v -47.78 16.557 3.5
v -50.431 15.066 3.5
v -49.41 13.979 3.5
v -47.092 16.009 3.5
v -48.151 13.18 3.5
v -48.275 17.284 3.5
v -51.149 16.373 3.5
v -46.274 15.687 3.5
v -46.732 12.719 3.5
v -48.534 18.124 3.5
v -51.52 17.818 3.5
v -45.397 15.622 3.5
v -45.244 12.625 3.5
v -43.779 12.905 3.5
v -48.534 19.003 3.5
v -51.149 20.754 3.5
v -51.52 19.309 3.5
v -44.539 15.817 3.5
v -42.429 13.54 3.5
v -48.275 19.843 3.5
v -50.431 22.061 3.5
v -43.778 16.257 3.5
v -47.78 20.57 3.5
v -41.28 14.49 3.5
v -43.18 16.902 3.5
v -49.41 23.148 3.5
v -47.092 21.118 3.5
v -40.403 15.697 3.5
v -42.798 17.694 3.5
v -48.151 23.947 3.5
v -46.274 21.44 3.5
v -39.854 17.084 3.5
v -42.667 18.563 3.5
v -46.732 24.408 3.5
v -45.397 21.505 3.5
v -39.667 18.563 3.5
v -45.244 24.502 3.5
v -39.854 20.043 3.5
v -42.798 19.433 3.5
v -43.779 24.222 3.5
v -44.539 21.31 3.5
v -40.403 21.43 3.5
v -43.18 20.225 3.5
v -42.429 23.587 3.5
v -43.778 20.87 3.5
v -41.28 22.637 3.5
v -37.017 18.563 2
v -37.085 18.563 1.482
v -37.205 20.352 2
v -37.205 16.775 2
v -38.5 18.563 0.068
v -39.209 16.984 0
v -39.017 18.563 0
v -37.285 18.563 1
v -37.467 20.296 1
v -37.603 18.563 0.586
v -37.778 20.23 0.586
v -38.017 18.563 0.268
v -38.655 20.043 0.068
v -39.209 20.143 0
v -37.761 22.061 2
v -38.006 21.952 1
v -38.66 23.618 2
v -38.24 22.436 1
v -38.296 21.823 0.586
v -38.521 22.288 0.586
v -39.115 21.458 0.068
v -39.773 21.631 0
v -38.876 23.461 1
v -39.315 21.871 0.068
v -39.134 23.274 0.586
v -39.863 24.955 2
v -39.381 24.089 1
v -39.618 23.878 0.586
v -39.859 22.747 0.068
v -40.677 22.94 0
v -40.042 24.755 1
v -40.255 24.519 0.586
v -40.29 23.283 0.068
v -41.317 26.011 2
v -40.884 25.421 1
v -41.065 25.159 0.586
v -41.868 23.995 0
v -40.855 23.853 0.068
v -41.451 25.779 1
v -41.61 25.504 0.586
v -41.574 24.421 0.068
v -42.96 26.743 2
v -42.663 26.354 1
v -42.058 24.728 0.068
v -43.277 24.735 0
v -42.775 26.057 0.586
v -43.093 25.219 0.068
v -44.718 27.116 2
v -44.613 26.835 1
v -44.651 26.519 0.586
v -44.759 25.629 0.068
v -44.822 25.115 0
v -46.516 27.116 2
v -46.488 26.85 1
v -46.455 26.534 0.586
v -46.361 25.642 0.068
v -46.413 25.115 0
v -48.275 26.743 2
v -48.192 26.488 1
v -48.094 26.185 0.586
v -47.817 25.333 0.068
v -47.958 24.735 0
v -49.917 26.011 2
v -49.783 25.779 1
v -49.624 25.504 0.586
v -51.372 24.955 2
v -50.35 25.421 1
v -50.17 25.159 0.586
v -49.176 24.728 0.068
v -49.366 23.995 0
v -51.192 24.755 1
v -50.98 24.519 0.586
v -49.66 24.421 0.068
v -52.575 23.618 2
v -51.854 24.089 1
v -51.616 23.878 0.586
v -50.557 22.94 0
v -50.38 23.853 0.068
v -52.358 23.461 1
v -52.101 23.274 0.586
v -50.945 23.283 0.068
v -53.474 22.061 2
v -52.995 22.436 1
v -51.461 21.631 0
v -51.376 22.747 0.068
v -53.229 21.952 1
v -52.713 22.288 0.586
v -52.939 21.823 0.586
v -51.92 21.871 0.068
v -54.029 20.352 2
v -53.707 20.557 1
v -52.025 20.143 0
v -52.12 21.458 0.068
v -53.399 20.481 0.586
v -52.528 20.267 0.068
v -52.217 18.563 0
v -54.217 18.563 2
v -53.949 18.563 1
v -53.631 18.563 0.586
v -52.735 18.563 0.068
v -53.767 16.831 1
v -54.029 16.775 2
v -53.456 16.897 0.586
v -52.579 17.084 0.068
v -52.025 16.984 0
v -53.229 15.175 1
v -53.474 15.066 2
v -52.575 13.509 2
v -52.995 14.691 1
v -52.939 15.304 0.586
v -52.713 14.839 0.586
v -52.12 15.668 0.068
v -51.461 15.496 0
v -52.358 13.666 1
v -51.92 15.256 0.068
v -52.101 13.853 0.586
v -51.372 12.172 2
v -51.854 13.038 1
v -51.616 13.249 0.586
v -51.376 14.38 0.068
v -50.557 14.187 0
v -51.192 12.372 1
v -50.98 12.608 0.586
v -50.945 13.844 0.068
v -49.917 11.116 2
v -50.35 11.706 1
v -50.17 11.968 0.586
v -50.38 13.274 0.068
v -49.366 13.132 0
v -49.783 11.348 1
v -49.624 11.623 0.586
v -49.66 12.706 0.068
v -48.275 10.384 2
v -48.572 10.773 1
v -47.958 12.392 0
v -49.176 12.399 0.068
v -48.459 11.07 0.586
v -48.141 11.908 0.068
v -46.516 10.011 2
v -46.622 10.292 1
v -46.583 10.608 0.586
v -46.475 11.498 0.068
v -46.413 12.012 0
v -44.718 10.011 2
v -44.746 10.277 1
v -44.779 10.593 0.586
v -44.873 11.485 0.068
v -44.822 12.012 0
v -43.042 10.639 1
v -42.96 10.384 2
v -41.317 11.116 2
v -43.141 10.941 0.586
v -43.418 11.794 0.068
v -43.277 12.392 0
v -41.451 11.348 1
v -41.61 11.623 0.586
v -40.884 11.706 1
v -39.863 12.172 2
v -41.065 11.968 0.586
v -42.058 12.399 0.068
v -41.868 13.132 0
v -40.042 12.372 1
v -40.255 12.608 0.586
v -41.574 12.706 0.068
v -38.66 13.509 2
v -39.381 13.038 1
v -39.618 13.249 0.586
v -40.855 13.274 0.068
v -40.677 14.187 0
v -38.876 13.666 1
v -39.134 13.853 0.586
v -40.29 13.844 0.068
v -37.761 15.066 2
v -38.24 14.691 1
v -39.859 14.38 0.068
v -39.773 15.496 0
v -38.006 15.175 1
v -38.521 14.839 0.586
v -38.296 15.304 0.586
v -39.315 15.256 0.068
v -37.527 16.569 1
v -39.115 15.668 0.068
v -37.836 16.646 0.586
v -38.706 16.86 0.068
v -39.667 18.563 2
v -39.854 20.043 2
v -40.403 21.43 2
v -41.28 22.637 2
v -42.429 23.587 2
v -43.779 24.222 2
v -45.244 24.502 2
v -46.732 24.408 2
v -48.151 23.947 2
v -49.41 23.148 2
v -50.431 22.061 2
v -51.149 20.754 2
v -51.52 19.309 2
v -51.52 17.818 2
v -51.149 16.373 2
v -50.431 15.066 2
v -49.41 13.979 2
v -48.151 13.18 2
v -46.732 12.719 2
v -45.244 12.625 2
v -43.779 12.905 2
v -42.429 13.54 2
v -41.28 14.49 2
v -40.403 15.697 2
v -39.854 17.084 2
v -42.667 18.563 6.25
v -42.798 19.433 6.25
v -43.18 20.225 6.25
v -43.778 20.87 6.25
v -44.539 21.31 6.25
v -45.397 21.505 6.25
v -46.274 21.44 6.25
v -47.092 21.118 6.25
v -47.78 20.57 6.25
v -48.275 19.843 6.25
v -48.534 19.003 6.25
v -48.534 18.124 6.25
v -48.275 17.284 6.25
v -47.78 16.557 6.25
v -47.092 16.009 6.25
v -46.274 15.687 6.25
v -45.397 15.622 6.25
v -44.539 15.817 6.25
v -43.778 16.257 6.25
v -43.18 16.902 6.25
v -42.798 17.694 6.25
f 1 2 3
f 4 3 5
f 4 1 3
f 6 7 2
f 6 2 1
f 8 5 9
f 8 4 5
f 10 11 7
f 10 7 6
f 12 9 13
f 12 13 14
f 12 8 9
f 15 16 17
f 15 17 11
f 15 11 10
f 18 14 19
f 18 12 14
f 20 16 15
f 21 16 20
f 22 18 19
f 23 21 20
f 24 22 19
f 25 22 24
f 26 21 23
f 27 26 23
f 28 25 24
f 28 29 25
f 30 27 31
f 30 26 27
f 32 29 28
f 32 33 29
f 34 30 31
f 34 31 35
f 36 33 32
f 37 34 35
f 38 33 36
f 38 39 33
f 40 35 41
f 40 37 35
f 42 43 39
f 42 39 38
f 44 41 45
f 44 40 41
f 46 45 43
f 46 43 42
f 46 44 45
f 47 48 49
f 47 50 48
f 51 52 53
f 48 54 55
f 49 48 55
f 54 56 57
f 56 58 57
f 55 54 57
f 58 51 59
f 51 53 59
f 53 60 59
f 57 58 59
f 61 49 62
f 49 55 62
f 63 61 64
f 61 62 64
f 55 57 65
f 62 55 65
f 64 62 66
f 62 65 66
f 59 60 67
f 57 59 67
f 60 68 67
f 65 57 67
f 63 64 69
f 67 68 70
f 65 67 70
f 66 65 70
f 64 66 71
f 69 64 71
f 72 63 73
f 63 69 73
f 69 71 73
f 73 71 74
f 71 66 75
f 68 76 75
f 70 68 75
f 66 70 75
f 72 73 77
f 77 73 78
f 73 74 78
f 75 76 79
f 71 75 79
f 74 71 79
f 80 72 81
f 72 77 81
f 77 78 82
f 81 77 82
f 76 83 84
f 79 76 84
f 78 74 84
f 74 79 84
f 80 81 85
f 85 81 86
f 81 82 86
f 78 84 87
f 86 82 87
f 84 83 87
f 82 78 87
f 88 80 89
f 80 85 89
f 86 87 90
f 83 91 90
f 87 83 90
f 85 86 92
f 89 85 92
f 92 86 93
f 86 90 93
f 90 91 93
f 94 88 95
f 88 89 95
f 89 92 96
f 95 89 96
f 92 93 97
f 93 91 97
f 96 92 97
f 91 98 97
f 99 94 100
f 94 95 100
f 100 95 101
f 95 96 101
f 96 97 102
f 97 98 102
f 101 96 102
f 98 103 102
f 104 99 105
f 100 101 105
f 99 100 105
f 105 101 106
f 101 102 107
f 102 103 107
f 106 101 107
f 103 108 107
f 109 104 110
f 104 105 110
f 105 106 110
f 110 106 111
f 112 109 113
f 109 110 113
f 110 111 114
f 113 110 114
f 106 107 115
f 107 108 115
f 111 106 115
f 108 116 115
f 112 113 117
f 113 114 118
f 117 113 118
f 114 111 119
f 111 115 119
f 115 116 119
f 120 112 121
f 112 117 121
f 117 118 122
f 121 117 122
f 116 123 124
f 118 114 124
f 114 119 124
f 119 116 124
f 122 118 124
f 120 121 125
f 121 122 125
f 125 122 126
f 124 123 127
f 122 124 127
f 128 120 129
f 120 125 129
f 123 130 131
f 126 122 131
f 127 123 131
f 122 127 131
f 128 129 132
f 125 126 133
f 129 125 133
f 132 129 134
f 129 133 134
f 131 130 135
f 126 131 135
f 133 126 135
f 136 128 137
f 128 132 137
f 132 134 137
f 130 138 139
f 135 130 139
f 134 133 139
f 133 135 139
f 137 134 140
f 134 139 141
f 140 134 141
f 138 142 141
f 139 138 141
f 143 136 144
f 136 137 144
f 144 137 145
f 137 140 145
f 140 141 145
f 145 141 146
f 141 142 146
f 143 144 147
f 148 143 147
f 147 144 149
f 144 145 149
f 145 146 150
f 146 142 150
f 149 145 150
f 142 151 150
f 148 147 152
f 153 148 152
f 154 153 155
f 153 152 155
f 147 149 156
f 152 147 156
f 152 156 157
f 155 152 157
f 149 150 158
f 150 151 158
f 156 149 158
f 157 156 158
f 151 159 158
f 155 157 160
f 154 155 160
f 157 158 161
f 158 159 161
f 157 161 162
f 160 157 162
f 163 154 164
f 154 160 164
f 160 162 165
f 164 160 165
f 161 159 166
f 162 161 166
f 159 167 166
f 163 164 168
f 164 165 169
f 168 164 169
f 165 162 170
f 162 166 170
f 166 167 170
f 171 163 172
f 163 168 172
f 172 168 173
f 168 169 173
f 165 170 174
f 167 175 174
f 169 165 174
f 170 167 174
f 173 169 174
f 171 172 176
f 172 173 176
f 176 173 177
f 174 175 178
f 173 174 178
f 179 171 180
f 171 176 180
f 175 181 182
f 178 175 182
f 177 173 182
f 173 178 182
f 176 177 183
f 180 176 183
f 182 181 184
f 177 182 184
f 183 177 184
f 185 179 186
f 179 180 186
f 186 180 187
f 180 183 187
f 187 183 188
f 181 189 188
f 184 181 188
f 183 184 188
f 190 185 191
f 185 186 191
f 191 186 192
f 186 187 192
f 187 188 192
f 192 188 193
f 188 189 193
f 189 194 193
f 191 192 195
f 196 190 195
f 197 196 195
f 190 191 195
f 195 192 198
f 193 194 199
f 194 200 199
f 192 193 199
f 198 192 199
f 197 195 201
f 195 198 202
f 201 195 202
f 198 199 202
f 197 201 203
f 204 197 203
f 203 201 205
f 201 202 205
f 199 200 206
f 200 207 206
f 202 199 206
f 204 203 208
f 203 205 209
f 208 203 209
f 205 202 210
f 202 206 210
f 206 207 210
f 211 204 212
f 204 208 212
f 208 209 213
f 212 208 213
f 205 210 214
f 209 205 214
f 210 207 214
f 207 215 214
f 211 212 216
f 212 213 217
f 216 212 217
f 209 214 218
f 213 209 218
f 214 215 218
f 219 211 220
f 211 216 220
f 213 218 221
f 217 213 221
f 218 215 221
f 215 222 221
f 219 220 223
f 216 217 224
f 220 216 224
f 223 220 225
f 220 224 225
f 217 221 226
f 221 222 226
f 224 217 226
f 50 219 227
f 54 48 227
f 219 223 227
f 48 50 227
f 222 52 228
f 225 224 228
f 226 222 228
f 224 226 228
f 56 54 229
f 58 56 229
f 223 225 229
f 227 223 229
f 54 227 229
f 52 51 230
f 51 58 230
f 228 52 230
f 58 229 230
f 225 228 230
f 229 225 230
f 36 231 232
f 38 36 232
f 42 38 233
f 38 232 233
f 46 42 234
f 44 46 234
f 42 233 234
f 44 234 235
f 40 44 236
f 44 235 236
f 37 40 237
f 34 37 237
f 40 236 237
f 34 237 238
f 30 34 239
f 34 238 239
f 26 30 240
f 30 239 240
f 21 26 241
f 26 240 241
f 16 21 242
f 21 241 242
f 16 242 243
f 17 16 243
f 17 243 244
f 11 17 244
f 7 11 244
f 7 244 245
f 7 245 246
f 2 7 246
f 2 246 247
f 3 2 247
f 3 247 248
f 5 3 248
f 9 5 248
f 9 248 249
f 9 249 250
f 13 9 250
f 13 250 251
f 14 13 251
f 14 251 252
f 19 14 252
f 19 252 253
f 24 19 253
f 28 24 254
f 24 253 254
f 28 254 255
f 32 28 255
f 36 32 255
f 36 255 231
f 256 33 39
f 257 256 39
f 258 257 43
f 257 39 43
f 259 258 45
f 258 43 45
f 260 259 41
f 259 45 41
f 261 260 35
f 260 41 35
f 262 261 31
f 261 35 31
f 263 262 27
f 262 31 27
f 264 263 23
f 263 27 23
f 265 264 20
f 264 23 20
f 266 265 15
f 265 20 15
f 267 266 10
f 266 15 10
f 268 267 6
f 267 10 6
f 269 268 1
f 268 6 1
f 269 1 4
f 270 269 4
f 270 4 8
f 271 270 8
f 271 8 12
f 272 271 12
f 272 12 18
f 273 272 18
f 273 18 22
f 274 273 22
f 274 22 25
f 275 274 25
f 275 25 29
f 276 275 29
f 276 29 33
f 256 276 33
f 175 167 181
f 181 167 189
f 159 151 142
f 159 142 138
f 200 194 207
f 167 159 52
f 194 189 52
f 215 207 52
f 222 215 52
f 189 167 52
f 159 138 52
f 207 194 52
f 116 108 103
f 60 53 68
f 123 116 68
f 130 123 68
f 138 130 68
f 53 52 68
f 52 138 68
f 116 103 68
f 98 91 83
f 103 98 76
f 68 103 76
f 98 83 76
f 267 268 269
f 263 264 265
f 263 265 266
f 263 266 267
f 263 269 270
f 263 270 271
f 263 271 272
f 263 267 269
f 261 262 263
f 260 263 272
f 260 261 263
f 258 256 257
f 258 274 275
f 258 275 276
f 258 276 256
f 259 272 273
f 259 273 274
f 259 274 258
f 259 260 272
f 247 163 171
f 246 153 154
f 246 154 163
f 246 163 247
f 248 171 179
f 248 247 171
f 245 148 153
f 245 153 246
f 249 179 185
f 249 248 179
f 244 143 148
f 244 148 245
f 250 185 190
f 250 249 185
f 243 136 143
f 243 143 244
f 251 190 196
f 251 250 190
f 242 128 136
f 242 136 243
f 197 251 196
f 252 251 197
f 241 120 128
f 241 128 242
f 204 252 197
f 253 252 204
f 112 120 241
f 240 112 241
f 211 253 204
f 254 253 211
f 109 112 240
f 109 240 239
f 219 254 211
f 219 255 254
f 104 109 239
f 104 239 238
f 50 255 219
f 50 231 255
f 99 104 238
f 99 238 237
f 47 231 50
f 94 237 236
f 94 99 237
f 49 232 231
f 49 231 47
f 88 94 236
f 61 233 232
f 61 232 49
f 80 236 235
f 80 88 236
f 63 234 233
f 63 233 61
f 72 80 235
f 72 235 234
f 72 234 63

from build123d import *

# Parameters (mm, degrees)
F0_R     = 8.6
F0_R_2   = 5.95
F1_DEPTH = 2
F0_R_3   = 2.95
F2_DEPTH = 3.5
F3_DEPTH = 6.25
F4_R     = 1.99999


# Not quite as in the source:
# - a fillet or chamfer is up to 0.001 mm smaller than in the source, because OpenCascade refuses the exact size
# - a feature names something its author has since deleted; it is built from what else it names


with BuildPart() as f1:
    # F0 (on Top) → F1 (new body)
    with BuildSketch(Plane.XY):
        with Locations((-45.6172116101, 18.5634717345)):
            Circle(F0_R)
        with Locations((-45.6172116101, 18.5634717345)):
            Circle(F0_R_2, mode=Mode.SUBTRACT)
    extrude(amount=F1_DEPTH)

    # F0 (on Top) → F2 (join)
    with BuildSketch(Plane.XY):
        with Locations((-45.6172116101, 18.5634717345)):
            Circle(F0_R_2)
        with Locations((-45.6172116101, 18.5634717345)):
            Circle(F0_R_3, mode=Mode.SUBTRACT)
    extrude(amount=F2_DEPTH)

    # F0 (on Top) → F3 (join)
    with BuildSketch(Plane.XY):
        with Locations((-45.6172116101, 18.5634717345)):
            Circle(F0_R_3)
    extrude(amount=F3_DEPTH)

    # F4 (radius 2 in the source; OpenCascade refuses exactly that, so slightly less here)
    f4_edges = [f1.edges().sort_by_distance(p)[0] for p in [
        (-54.217212, 18.563472, 0),
    ]]
    fillet(f4_edges, radius=F4_R)


solid = f1.part
